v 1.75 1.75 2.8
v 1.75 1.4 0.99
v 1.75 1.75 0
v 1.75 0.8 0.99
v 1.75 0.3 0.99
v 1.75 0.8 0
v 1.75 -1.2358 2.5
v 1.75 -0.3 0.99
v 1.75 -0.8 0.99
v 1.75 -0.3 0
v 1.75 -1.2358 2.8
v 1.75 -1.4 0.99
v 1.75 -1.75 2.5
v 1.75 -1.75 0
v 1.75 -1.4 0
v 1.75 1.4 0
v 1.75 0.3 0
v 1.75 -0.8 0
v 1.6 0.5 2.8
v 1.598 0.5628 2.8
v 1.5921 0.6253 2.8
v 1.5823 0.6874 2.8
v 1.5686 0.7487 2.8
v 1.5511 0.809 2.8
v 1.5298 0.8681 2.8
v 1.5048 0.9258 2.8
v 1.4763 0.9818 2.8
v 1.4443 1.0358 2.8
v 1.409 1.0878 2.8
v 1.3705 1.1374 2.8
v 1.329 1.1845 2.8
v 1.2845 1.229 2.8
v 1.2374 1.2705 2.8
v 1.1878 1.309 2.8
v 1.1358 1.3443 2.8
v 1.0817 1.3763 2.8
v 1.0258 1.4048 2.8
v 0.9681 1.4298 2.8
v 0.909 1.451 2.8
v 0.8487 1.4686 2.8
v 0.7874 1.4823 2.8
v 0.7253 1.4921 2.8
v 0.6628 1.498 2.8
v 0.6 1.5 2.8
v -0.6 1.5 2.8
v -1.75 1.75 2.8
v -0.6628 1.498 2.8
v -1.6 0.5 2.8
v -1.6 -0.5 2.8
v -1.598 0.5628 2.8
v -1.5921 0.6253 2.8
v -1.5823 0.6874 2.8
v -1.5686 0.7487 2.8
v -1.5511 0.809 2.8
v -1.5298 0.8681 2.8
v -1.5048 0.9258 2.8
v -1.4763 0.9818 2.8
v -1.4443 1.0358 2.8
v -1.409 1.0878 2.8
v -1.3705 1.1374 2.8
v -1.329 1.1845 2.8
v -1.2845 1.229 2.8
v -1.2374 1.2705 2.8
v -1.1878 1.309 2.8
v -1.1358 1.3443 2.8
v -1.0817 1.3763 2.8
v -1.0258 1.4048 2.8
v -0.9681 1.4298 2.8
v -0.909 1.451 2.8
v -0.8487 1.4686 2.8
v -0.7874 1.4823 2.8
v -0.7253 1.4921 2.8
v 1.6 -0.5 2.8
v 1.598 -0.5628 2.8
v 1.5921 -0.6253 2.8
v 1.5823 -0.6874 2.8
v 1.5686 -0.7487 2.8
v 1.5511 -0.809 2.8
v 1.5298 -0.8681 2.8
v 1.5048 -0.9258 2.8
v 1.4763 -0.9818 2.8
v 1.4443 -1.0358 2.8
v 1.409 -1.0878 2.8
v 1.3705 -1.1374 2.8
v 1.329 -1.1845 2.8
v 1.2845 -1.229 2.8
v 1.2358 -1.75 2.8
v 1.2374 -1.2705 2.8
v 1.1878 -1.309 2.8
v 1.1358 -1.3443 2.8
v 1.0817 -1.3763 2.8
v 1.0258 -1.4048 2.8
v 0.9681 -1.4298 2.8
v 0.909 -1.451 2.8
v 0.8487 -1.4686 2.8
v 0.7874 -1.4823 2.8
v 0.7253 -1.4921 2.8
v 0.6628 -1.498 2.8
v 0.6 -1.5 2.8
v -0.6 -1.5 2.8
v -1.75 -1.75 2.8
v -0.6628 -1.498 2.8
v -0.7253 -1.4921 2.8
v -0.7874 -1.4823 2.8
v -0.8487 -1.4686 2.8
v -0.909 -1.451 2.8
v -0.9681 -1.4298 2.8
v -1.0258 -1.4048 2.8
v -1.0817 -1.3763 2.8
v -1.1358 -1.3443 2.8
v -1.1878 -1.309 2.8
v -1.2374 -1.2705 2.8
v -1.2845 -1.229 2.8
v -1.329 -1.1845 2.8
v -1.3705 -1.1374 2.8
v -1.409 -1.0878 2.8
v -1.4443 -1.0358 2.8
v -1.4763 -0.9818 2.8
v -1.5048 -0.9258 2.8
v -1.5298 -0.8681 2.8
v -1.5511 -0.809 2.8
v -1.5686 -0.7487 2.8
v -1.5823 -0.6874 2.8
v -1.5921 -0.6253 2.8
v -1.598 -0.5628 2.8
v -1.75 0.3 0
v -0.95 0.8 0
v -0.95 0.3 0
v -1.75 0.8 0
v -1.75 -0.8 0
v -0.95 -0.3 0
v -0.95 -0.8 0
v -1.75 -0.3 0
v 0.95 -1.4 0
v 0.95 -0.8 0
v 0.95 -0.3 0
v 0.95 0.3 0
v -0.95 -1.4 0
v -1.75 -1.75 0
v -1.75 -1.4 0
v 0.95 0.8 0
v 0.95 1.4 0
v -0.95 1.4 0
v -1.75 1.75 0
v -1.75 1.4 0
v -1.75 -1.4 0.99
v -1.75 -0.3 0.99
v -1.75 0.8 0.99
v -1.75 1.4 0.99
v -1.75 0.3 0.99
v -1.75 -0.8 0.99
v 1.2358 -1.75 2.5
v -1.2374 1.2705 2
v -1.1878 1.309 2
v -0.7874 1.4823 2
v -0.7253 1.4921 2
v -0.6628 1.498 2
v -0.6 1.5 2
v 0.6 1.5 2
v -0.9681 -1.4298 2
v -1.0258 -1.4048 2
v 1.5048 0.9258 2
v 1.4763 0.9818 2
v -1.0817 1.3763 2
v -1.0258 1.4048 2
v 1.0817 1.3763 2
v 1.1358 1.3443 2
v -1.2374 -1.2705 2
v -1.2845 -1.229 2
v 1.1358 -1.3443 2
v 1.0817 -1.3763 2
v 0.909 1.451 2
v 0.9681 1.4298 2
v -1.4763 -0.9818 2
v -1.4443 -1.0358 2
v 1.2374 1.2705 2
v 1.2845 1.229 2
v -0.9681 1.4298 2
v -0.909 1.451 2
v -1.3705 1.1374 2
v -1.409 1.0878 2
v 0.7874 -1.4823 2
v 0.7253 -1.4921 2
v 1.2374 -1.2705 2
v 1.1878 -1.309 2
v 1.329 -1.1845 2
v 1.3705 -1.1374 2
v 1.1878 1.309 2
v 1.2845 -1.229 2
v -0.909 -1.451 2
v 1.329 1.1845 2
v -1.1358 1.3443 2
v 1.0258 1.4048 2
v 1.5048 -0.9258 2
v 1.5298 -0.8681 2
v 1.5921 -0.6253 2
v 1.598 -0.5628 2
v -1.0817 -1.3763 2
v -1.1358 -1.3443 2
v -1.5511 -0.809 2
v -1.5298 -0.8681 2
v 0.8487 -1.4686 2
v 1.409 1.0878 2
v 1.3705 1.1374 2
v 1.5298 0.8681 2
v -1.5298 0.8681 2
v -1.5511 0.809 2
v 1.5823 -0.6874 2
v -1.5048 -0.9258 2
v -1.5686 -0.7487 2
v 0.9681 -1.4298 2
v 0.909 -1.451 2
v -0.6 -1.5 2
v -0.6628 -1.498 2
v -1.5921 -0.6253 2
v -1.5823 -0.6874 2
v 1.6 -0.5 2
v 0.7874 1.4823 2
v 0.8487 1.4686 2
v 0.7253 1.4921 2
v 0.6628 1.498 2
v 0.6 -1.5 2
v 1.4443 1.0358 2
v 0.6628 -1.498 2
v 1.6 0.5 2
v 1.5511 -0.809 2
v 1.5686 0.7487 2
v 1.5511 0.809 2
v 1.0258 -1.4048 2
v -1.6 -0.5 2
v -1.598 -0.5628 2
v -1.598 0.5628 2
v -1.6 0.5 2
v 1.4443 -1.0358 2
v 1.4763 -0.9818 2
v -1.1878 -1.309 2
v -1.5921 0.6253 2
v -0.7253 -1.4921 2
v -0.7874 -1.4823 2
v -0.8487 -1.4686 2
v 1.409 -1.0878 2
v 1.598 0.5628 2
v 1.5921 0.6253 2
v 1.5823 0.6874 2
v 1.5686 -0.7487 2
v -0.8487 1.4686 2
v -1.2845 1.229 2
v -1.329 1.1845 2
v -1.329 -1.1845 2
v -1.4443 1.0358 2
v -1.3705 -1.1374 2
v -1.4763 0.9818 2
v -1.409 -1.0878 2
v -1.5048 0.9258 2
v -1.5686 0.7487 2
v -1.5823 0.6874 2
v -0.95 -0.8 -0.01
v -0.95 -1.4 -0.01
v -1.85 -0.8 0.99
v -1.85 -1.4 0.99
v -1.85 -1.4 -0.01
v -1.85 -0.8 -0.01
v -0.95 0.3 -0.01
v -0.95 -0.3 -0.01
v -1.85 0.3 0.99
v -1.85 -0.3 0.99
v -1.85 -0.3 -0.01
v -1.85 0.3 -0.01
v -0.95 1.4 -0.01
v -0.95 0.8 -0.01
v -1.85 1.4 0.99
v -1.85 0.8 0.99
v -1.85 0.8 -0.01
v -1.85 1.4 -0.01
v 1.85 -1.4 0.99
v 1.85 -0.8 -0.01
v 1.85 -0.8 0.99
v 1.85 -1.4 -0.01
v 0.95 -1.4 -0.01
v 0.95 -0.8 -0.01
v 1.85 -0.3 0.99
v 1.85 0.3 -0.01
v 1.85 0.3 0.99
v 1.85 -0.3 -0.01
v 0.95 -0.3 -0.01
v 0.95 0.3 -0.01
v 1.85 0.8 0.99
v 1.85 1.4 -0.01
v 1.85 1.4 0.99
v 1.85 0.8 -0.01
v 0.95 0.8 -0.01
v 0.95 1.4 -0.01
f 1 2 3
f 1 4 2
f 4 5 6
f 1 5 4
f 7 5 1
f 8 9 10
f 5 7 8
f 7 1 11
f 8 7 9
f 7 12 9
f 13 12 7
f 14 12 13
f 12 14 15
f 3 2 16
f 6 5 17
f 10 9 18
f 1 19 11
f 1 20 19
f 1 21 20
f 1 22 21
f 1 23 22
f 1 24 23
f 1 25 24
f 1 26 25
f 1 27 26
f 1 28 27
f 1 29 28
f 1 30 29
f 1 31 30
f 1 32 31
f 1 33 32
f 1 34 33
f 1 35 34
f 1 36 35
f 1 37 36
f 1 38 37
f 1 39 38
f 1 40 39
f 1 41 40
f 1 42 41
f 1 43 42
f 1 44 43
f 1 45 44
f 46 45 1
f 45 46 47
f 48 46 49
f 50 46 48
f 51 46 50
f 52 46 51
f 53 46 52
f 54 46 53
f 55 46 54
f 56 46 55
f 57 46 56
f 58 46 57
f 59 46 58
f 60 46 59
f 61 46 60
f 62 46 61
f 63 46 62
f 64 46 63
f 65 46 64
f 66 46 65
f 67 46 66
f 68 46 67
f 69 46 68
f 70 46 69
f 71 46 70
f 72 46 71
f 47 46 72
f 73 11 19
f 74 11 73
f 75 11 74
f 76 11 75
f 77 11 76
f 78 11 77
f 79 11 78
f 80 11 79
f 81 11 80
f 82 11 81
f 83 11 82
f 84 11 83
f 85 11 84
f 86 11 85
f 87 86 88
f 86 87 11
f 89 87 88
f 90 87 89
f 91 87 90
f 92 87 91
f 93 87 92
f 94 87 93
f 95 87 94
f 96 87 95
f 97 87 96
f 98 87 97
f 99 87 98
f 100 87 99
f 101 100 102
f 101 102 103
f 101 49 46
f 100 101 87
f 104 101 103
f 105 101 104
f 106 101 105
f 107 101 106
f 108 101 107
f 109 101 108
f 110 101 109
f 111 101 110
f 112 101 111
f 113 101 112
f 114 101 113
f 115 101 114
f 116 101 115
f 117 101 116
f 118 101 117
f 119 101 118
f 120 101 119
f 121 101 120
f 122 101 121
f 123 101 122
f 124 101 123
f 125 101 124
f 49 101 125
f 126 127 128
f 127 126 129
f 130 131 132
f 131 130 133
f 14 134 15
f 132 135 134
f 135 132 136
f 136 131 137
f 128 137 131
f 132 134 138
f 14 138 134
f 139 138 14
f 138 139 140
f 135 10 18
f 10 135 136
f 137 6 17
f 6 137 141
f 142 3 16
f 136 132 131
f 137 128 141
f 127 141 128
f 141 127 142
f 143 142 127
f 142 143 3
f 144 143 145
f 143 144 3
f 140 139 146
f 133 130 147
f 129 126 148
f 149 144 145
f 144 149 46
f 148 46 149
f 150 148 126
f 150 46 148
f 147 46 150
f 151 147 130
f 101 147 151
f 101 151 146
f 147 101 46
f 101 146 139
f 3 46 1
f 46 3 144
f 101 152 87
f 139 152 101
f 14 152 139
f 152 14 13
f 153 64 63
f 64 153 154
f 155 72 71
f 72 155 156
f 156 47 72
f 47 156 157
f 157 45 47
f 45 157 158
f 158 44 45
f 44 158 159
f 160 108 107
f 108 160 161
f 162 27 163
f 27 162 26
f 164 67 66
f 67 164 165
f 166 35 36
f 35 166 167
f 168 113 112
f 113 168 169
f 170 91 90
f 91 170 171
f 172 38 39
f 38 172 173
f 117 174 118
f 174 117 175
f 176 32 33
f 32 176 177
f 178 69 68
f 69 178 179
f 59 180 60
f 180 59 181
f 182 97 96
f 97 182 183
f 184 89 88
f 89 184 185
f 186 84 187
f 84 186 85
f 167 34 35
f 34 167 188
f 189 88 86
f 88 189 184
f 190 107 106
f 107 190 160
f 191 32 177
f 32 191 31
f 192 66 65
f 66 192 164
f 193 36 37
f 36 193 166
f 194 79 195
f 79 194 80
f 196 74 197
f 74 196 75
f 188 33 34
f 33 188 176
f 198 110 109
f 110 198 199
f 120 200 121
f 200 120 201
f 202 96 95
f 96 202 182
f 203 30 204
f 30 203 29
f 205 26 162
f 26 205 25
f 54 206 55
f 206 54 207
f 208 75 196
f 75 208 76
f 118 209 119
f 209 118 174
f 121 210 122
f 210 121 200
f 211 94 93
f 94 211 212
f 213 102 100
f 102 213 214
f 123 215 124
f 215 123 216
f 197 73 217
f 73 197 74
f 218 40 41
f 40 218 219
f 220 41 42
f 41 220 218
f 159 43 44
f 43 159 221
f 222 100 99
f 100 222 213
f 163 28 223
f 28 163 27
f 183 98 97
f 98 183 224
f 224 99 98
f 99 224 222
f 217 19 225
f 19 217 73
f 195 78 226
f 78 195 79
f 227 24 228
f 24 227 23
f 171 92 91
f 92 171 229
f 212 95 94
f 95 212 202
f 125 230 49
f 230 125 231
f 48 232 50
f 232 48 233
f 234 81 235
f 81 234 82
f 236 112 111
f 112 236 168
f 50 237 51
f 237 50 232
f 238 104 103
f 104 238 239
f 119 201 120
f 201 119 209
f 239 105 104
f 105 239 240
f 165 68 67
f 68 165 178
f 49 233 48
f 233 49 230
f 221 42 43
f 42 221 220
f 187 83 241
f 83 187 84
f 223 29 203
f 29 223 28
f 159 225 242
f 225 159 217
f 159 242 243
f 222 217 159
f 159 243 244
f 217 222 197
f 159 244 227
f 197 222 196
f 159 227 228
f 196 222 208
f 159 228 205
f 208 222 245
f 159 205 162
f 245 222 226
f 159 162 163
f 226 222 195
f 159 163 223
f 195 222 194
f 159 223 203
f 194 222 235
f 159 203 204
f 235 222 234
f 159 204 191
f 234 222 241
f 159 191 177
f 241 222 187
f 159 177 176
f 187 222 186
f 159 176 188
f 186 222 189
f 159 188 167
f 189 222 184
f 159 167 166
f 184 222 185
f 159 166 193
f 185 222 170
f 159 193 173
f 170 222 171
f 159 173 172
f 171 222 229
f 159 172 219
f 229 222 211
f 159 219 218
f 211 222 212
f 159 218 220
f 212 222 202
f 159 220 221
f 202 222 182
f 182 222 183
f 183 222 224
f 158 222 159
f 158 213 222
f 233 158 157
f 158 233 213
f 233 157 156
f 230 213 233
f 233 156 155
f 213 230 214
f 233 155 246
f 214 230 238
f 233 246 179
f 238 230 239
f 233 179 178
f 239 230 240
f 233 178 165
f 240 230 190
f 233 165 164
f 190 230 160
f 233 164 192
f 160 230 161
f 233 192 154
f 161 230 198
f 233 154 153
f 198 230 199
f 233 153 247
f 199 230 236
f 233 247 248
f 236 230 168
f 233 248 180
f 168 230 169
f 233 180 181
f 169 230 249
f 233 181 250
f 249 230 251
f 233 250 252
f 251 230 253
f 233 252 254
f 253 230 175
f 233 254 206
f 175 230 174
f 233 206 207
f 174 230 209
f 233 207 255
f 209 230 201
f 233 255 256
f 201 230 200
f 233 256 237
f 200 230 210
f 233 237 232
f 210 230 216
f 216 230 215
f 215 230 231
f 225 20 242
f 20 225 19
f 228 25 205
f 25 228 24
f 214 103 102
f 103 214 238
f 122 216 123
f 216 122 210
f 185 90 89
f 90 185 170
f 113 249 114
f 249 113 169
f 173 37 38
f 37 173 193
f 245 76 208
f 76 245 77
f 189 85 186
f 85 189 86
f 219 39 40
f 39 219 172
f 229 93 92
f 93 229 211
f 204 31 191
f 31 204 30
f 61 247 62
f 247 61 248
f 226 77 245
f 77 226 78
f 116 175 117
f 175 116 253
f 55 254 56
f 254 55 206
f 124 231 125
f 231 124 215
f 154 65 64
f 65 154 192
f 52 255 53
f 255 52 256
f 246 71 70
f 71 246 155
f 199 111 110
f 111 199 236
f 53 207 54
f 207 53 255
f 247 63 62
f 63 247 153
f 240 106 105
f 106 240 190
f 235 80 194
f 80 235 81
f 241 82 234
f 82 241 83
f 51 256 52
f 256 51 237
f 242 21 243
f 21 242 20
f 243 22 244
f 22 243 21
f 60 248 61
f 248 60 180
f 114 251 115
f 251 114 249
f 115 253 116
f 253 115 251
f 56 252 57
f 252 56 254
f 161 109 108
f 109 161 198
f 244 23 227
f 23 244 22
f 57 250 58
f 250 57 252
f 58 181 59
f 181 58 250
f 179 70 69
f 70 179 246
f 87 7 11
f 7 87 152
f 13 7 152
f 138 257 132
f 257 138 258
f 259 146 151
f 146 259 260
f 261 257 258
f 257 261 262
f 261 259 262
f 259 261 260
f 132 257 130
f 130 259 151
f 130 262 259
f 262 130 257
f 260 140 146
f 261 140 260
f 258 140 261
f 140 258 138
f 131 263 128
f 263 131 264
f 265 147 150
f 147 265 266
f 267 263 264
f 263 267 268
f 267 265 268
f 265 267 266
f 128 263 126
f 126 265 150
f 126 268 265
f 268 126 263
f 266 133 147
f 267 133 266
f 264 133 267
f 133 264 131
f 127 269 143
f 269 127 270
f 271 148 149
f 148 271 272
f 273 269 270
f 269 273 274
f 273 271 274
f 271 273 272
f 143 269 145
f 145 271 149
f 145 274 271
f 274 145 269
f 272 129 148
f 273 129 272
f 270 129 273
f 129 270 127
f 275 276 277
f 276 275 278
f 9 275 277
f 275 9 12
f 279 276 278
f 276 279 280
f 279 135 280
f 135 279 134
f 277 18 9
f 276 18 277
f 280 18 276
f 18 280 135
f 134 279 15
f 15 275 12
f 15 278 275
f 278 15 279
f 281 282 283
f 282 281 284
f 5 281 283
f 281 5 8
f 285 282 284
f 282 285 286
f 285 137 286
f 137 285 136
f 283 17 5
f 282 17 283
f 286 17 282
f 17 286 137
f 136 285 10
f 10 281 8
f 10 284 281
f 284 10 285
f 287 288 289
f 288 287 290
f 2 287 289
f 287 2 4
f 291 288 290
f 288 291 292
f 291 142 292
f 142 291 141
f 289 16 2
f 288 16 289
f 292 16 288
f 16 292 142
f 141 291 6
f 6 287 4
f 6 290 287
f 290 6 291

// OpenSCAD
// file: helpers.scad
// centered on XY only
module cube_(size=[1, 1, 1])
	translate([-size[0] / 2, -size[1] / 2, 0])
		cube(size);

// centered on XY only
module roundedcubez(size = [1, 1, 1], radius = 0.5) {
	linear_extrude(height=size[2]) {
		square([size[0] - 2 * radius, size[1]], center=true);
		square([size[0], size[1] - 2 * radius], center=true);
		for (i=[-1, 1])
			for (j=[-1, 1])
				translate([i * (size[0] / 2 - radius), j * (size[1] / 2 - radius), 0])
					circle(r = radius);
	}
}
// main file
// PLCC6 RGB LED
// https://jlcpcb.com/api/file/downloadByFileSystemAccessId/8588884074492125184

$fn = $preview ? 30 : 100;

include <helpers.scad>

difference() {
	cube_([3.5, 3.5, 2.8]);
	translate([0, 0, 2])
		roundedcubez(size = [3.2, 3.0, 5], radius = 1);
	translate([2.2, -2.2, 2.5])
		rotate([0, 0, 45])
			cube_([2, 2, 2]);
}

color("grey")
	for (x=[-1, 1])
		for (y=[-1, 0, 1])
			translate([(3.7 - 0.9) / 2 * x, (2.8 - 0.6) / 2 * y, -0.01])
				cube_([0.9, 0.6, 1.0]);
